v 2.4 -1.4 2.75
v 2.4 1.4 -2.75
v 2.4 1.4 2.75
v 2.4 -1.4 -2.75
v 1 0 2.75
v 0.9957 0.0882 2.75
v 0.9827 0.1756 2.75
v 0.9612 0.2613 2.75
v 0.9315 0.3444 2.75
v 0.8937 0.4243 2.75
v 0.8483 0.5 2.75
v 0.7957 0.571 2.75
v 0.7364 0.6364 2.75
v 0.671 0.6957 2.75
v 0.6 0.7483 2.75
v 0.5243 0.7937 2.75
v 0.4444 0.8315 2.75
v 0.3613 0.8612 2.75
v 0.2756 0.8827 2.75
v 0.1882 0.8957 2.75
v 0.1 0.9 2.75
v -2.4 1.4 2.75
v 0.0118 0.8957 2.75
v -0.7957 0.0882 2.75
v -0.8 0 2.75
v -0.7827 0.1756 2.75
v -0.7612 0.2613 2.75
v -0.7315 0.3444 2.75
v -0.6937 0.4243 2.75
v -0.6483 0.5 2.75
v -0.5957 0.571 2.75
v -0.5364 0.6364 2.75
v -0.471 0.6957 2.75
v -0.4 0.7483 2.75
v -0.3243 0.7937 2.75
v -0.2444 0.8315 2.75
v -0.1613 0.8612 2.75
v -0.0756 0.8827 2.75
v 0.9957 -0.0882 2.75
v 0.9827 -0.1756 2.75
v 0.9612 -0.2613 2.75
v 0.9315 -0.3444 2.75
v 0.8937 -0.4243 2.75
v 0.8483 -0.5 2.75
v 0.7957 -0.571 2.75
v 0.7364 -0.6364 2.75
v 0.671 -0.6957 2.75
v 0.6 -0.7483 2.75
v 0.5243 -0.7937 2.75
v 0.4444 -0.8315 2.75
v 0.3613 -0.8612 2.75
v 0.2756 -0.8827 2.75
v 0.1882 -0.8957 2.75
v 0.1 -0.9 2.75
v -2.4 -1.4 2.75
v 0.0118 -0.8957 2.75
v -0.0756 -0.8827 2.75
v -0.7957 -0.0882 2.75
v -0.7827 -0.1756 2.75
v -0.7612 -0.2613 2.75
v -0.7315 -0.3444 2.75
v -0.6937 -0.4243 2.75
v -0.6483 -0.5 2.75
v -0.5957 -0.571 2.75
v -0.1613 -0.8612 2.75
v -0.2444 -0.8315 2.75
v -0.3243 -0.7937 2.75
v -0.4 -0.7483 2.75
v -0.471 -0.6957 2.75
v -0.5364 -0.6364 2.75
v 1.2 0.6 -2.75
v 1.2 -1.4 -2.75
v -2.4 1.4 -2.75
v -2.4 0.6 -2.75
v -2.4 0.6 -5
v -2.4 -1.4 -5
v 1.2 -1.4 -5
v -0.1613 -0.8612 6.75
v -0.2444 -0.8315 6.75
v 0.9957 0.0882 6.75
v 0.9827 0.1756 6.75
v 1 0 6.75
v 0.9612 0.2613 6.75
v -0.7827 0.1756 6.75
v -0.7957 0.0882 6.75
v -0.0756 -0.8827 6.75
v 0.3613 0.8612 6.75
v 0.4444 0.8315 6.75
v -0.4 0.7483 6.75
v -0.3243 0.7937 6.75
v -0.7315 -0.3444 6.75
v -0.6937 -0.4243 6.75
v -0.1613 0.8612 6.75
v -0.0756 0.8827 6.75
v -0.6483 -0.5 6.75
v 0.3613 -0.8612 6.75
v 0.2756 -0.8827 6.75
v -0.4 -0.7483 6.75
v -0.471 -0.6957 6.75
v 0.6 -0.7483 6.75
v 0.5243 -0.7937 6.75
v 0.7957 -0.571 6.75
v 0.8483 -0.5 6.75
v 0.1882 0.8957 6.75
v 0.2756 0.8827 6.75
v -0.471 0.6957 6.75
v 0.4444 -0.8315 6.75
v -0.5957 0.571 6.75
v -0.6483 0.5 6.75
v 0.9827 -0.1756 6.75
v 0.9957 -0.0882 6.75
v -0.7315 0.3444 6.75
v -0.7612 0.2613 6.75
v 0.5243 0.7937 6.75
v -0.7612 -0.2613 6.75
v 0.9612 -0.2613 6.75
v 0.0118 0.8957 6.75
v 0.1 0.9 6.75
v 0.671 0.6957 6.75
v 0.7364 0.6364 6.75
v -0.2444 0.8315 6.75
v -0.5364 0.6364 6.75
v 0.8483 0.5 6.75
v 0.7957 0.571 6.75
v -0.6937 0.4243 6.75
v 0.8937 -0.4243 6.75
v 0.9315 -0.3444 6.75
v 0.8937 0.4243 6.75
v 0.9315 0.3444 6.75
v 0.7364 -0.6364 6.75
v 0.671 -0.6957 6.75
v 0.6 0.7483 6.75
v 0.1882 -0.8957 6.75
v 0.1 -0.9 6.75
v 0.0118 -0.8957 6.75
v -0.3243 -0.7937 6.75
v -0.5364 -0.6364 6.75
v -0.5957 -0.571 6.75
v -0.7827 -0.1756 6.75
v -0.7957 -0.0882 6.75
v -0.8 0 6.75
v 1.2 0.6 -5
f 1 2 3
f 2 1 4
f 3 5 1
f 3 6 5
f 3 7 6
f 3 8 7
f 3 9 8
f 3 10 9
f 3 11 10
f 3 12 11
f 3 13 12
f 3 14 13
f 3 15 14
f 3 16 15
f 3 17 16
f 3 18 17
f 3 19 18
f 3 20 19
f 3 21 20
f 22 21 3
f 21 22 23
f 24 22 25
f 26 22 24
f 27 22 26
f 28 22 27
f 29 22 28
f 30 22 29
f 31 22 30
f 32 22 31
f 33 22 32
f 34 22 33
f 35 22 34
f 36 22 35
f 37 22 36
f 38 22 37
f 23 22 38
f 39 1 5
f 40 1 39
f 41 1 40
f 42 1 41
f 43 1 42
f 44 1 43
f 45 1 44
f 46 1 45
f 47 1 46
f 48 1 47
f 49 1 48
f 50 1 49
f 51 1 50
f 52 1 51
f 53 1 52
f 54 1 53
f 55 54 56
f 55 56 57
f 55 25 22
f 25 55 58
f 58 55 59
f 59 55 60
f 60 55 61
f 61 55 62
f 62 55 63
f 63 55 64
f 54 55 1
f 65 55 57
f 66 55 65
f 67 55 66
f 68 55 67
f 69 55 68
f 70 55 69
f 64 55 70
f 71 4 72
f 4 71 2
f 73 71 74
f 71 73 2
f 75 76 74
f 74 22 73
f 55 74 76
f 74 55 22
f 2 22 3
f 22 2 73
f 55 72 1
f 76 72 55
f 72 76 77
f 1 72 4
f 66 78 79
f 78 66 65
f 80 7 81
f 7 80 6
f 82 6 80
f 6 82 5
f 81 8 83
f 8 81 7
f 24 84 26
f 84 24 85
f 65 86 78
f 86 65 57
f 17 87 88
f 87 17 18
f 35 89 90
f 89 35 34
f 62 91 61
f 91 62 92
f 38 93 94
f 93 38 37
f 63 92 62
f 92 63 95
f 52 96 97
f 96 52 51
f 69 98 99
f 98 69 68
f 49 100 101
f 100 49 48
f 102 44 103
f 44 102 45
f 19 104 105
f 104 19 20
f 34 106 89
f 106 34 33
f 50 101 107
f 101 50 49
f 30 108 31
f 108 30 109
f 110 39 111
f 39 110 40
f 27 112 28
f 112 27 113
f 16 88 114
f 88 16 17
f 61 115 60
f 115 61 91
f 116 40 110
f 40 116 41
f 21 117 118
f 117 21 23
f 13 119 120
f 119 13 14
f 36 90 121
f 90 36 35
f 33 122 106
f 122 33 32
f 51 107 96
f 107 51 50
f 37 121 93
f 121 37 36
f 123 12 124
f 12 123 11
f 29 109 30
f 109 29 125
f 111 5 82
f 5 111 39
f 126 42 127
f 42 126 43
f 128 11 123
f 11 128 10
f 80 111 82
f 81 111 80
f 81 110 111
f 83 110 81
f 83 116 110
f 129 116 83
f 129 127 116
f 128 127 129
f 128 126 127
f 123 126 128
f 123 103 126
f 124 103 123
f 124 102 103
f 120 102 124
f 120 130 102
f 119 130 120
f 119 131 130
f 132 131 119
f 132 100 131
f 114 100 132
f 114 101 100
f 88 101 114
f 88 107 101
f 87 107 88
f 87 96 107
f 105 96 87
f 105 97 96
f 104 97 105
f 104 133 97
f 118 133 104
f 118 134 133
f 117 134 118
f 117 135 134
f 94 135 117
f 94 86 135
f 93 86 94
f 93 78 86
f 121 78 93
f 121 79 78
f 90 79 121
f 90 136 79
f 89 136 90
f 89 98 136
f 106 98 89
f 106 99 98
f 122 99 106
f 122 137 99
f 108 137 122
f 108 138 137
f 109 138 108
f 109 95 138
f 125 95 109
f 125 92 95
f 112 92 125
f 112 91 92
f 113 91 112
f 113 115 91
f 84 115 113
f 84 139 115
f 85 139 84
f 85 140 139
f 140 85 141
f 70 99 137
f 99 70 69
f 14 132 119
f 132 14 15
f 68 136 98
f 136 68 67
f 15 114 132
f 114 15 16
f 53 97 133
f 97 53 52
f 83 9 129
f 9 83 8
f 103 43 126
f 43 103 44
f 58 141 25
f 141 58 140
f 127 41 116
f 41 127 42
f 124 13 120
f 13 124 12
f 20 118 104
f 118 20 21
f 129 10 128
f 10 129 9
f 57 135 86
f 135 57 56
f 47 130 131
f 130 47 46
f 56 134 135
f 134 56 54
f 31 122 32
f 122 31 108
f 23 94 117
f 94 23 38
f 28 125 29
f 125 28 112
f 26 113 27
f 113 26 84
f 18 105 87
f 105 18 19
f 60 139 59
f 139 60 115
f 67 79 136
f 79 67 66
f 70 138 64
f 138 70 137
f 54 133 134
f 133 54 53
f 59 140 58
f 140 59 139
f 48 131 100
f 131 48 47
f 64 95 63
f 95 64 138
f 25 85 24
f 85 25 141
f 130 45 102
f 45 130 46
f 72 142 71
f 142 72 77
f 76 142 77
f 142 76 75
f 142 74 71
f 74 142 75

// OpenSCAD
// Copyright 2019 a.j.buxton@gmail.com
// CC BY-NC-ND 4.0

$fn = 64;

cube([4.8, 2.8, 5.5], center=true);
translate([0.1, 0, 4]) cylinder(d=1.8, h=5.5, center=true);

translate([-0.6, -0.4, -3]) cube([3.6, 2, 4], center=true);
